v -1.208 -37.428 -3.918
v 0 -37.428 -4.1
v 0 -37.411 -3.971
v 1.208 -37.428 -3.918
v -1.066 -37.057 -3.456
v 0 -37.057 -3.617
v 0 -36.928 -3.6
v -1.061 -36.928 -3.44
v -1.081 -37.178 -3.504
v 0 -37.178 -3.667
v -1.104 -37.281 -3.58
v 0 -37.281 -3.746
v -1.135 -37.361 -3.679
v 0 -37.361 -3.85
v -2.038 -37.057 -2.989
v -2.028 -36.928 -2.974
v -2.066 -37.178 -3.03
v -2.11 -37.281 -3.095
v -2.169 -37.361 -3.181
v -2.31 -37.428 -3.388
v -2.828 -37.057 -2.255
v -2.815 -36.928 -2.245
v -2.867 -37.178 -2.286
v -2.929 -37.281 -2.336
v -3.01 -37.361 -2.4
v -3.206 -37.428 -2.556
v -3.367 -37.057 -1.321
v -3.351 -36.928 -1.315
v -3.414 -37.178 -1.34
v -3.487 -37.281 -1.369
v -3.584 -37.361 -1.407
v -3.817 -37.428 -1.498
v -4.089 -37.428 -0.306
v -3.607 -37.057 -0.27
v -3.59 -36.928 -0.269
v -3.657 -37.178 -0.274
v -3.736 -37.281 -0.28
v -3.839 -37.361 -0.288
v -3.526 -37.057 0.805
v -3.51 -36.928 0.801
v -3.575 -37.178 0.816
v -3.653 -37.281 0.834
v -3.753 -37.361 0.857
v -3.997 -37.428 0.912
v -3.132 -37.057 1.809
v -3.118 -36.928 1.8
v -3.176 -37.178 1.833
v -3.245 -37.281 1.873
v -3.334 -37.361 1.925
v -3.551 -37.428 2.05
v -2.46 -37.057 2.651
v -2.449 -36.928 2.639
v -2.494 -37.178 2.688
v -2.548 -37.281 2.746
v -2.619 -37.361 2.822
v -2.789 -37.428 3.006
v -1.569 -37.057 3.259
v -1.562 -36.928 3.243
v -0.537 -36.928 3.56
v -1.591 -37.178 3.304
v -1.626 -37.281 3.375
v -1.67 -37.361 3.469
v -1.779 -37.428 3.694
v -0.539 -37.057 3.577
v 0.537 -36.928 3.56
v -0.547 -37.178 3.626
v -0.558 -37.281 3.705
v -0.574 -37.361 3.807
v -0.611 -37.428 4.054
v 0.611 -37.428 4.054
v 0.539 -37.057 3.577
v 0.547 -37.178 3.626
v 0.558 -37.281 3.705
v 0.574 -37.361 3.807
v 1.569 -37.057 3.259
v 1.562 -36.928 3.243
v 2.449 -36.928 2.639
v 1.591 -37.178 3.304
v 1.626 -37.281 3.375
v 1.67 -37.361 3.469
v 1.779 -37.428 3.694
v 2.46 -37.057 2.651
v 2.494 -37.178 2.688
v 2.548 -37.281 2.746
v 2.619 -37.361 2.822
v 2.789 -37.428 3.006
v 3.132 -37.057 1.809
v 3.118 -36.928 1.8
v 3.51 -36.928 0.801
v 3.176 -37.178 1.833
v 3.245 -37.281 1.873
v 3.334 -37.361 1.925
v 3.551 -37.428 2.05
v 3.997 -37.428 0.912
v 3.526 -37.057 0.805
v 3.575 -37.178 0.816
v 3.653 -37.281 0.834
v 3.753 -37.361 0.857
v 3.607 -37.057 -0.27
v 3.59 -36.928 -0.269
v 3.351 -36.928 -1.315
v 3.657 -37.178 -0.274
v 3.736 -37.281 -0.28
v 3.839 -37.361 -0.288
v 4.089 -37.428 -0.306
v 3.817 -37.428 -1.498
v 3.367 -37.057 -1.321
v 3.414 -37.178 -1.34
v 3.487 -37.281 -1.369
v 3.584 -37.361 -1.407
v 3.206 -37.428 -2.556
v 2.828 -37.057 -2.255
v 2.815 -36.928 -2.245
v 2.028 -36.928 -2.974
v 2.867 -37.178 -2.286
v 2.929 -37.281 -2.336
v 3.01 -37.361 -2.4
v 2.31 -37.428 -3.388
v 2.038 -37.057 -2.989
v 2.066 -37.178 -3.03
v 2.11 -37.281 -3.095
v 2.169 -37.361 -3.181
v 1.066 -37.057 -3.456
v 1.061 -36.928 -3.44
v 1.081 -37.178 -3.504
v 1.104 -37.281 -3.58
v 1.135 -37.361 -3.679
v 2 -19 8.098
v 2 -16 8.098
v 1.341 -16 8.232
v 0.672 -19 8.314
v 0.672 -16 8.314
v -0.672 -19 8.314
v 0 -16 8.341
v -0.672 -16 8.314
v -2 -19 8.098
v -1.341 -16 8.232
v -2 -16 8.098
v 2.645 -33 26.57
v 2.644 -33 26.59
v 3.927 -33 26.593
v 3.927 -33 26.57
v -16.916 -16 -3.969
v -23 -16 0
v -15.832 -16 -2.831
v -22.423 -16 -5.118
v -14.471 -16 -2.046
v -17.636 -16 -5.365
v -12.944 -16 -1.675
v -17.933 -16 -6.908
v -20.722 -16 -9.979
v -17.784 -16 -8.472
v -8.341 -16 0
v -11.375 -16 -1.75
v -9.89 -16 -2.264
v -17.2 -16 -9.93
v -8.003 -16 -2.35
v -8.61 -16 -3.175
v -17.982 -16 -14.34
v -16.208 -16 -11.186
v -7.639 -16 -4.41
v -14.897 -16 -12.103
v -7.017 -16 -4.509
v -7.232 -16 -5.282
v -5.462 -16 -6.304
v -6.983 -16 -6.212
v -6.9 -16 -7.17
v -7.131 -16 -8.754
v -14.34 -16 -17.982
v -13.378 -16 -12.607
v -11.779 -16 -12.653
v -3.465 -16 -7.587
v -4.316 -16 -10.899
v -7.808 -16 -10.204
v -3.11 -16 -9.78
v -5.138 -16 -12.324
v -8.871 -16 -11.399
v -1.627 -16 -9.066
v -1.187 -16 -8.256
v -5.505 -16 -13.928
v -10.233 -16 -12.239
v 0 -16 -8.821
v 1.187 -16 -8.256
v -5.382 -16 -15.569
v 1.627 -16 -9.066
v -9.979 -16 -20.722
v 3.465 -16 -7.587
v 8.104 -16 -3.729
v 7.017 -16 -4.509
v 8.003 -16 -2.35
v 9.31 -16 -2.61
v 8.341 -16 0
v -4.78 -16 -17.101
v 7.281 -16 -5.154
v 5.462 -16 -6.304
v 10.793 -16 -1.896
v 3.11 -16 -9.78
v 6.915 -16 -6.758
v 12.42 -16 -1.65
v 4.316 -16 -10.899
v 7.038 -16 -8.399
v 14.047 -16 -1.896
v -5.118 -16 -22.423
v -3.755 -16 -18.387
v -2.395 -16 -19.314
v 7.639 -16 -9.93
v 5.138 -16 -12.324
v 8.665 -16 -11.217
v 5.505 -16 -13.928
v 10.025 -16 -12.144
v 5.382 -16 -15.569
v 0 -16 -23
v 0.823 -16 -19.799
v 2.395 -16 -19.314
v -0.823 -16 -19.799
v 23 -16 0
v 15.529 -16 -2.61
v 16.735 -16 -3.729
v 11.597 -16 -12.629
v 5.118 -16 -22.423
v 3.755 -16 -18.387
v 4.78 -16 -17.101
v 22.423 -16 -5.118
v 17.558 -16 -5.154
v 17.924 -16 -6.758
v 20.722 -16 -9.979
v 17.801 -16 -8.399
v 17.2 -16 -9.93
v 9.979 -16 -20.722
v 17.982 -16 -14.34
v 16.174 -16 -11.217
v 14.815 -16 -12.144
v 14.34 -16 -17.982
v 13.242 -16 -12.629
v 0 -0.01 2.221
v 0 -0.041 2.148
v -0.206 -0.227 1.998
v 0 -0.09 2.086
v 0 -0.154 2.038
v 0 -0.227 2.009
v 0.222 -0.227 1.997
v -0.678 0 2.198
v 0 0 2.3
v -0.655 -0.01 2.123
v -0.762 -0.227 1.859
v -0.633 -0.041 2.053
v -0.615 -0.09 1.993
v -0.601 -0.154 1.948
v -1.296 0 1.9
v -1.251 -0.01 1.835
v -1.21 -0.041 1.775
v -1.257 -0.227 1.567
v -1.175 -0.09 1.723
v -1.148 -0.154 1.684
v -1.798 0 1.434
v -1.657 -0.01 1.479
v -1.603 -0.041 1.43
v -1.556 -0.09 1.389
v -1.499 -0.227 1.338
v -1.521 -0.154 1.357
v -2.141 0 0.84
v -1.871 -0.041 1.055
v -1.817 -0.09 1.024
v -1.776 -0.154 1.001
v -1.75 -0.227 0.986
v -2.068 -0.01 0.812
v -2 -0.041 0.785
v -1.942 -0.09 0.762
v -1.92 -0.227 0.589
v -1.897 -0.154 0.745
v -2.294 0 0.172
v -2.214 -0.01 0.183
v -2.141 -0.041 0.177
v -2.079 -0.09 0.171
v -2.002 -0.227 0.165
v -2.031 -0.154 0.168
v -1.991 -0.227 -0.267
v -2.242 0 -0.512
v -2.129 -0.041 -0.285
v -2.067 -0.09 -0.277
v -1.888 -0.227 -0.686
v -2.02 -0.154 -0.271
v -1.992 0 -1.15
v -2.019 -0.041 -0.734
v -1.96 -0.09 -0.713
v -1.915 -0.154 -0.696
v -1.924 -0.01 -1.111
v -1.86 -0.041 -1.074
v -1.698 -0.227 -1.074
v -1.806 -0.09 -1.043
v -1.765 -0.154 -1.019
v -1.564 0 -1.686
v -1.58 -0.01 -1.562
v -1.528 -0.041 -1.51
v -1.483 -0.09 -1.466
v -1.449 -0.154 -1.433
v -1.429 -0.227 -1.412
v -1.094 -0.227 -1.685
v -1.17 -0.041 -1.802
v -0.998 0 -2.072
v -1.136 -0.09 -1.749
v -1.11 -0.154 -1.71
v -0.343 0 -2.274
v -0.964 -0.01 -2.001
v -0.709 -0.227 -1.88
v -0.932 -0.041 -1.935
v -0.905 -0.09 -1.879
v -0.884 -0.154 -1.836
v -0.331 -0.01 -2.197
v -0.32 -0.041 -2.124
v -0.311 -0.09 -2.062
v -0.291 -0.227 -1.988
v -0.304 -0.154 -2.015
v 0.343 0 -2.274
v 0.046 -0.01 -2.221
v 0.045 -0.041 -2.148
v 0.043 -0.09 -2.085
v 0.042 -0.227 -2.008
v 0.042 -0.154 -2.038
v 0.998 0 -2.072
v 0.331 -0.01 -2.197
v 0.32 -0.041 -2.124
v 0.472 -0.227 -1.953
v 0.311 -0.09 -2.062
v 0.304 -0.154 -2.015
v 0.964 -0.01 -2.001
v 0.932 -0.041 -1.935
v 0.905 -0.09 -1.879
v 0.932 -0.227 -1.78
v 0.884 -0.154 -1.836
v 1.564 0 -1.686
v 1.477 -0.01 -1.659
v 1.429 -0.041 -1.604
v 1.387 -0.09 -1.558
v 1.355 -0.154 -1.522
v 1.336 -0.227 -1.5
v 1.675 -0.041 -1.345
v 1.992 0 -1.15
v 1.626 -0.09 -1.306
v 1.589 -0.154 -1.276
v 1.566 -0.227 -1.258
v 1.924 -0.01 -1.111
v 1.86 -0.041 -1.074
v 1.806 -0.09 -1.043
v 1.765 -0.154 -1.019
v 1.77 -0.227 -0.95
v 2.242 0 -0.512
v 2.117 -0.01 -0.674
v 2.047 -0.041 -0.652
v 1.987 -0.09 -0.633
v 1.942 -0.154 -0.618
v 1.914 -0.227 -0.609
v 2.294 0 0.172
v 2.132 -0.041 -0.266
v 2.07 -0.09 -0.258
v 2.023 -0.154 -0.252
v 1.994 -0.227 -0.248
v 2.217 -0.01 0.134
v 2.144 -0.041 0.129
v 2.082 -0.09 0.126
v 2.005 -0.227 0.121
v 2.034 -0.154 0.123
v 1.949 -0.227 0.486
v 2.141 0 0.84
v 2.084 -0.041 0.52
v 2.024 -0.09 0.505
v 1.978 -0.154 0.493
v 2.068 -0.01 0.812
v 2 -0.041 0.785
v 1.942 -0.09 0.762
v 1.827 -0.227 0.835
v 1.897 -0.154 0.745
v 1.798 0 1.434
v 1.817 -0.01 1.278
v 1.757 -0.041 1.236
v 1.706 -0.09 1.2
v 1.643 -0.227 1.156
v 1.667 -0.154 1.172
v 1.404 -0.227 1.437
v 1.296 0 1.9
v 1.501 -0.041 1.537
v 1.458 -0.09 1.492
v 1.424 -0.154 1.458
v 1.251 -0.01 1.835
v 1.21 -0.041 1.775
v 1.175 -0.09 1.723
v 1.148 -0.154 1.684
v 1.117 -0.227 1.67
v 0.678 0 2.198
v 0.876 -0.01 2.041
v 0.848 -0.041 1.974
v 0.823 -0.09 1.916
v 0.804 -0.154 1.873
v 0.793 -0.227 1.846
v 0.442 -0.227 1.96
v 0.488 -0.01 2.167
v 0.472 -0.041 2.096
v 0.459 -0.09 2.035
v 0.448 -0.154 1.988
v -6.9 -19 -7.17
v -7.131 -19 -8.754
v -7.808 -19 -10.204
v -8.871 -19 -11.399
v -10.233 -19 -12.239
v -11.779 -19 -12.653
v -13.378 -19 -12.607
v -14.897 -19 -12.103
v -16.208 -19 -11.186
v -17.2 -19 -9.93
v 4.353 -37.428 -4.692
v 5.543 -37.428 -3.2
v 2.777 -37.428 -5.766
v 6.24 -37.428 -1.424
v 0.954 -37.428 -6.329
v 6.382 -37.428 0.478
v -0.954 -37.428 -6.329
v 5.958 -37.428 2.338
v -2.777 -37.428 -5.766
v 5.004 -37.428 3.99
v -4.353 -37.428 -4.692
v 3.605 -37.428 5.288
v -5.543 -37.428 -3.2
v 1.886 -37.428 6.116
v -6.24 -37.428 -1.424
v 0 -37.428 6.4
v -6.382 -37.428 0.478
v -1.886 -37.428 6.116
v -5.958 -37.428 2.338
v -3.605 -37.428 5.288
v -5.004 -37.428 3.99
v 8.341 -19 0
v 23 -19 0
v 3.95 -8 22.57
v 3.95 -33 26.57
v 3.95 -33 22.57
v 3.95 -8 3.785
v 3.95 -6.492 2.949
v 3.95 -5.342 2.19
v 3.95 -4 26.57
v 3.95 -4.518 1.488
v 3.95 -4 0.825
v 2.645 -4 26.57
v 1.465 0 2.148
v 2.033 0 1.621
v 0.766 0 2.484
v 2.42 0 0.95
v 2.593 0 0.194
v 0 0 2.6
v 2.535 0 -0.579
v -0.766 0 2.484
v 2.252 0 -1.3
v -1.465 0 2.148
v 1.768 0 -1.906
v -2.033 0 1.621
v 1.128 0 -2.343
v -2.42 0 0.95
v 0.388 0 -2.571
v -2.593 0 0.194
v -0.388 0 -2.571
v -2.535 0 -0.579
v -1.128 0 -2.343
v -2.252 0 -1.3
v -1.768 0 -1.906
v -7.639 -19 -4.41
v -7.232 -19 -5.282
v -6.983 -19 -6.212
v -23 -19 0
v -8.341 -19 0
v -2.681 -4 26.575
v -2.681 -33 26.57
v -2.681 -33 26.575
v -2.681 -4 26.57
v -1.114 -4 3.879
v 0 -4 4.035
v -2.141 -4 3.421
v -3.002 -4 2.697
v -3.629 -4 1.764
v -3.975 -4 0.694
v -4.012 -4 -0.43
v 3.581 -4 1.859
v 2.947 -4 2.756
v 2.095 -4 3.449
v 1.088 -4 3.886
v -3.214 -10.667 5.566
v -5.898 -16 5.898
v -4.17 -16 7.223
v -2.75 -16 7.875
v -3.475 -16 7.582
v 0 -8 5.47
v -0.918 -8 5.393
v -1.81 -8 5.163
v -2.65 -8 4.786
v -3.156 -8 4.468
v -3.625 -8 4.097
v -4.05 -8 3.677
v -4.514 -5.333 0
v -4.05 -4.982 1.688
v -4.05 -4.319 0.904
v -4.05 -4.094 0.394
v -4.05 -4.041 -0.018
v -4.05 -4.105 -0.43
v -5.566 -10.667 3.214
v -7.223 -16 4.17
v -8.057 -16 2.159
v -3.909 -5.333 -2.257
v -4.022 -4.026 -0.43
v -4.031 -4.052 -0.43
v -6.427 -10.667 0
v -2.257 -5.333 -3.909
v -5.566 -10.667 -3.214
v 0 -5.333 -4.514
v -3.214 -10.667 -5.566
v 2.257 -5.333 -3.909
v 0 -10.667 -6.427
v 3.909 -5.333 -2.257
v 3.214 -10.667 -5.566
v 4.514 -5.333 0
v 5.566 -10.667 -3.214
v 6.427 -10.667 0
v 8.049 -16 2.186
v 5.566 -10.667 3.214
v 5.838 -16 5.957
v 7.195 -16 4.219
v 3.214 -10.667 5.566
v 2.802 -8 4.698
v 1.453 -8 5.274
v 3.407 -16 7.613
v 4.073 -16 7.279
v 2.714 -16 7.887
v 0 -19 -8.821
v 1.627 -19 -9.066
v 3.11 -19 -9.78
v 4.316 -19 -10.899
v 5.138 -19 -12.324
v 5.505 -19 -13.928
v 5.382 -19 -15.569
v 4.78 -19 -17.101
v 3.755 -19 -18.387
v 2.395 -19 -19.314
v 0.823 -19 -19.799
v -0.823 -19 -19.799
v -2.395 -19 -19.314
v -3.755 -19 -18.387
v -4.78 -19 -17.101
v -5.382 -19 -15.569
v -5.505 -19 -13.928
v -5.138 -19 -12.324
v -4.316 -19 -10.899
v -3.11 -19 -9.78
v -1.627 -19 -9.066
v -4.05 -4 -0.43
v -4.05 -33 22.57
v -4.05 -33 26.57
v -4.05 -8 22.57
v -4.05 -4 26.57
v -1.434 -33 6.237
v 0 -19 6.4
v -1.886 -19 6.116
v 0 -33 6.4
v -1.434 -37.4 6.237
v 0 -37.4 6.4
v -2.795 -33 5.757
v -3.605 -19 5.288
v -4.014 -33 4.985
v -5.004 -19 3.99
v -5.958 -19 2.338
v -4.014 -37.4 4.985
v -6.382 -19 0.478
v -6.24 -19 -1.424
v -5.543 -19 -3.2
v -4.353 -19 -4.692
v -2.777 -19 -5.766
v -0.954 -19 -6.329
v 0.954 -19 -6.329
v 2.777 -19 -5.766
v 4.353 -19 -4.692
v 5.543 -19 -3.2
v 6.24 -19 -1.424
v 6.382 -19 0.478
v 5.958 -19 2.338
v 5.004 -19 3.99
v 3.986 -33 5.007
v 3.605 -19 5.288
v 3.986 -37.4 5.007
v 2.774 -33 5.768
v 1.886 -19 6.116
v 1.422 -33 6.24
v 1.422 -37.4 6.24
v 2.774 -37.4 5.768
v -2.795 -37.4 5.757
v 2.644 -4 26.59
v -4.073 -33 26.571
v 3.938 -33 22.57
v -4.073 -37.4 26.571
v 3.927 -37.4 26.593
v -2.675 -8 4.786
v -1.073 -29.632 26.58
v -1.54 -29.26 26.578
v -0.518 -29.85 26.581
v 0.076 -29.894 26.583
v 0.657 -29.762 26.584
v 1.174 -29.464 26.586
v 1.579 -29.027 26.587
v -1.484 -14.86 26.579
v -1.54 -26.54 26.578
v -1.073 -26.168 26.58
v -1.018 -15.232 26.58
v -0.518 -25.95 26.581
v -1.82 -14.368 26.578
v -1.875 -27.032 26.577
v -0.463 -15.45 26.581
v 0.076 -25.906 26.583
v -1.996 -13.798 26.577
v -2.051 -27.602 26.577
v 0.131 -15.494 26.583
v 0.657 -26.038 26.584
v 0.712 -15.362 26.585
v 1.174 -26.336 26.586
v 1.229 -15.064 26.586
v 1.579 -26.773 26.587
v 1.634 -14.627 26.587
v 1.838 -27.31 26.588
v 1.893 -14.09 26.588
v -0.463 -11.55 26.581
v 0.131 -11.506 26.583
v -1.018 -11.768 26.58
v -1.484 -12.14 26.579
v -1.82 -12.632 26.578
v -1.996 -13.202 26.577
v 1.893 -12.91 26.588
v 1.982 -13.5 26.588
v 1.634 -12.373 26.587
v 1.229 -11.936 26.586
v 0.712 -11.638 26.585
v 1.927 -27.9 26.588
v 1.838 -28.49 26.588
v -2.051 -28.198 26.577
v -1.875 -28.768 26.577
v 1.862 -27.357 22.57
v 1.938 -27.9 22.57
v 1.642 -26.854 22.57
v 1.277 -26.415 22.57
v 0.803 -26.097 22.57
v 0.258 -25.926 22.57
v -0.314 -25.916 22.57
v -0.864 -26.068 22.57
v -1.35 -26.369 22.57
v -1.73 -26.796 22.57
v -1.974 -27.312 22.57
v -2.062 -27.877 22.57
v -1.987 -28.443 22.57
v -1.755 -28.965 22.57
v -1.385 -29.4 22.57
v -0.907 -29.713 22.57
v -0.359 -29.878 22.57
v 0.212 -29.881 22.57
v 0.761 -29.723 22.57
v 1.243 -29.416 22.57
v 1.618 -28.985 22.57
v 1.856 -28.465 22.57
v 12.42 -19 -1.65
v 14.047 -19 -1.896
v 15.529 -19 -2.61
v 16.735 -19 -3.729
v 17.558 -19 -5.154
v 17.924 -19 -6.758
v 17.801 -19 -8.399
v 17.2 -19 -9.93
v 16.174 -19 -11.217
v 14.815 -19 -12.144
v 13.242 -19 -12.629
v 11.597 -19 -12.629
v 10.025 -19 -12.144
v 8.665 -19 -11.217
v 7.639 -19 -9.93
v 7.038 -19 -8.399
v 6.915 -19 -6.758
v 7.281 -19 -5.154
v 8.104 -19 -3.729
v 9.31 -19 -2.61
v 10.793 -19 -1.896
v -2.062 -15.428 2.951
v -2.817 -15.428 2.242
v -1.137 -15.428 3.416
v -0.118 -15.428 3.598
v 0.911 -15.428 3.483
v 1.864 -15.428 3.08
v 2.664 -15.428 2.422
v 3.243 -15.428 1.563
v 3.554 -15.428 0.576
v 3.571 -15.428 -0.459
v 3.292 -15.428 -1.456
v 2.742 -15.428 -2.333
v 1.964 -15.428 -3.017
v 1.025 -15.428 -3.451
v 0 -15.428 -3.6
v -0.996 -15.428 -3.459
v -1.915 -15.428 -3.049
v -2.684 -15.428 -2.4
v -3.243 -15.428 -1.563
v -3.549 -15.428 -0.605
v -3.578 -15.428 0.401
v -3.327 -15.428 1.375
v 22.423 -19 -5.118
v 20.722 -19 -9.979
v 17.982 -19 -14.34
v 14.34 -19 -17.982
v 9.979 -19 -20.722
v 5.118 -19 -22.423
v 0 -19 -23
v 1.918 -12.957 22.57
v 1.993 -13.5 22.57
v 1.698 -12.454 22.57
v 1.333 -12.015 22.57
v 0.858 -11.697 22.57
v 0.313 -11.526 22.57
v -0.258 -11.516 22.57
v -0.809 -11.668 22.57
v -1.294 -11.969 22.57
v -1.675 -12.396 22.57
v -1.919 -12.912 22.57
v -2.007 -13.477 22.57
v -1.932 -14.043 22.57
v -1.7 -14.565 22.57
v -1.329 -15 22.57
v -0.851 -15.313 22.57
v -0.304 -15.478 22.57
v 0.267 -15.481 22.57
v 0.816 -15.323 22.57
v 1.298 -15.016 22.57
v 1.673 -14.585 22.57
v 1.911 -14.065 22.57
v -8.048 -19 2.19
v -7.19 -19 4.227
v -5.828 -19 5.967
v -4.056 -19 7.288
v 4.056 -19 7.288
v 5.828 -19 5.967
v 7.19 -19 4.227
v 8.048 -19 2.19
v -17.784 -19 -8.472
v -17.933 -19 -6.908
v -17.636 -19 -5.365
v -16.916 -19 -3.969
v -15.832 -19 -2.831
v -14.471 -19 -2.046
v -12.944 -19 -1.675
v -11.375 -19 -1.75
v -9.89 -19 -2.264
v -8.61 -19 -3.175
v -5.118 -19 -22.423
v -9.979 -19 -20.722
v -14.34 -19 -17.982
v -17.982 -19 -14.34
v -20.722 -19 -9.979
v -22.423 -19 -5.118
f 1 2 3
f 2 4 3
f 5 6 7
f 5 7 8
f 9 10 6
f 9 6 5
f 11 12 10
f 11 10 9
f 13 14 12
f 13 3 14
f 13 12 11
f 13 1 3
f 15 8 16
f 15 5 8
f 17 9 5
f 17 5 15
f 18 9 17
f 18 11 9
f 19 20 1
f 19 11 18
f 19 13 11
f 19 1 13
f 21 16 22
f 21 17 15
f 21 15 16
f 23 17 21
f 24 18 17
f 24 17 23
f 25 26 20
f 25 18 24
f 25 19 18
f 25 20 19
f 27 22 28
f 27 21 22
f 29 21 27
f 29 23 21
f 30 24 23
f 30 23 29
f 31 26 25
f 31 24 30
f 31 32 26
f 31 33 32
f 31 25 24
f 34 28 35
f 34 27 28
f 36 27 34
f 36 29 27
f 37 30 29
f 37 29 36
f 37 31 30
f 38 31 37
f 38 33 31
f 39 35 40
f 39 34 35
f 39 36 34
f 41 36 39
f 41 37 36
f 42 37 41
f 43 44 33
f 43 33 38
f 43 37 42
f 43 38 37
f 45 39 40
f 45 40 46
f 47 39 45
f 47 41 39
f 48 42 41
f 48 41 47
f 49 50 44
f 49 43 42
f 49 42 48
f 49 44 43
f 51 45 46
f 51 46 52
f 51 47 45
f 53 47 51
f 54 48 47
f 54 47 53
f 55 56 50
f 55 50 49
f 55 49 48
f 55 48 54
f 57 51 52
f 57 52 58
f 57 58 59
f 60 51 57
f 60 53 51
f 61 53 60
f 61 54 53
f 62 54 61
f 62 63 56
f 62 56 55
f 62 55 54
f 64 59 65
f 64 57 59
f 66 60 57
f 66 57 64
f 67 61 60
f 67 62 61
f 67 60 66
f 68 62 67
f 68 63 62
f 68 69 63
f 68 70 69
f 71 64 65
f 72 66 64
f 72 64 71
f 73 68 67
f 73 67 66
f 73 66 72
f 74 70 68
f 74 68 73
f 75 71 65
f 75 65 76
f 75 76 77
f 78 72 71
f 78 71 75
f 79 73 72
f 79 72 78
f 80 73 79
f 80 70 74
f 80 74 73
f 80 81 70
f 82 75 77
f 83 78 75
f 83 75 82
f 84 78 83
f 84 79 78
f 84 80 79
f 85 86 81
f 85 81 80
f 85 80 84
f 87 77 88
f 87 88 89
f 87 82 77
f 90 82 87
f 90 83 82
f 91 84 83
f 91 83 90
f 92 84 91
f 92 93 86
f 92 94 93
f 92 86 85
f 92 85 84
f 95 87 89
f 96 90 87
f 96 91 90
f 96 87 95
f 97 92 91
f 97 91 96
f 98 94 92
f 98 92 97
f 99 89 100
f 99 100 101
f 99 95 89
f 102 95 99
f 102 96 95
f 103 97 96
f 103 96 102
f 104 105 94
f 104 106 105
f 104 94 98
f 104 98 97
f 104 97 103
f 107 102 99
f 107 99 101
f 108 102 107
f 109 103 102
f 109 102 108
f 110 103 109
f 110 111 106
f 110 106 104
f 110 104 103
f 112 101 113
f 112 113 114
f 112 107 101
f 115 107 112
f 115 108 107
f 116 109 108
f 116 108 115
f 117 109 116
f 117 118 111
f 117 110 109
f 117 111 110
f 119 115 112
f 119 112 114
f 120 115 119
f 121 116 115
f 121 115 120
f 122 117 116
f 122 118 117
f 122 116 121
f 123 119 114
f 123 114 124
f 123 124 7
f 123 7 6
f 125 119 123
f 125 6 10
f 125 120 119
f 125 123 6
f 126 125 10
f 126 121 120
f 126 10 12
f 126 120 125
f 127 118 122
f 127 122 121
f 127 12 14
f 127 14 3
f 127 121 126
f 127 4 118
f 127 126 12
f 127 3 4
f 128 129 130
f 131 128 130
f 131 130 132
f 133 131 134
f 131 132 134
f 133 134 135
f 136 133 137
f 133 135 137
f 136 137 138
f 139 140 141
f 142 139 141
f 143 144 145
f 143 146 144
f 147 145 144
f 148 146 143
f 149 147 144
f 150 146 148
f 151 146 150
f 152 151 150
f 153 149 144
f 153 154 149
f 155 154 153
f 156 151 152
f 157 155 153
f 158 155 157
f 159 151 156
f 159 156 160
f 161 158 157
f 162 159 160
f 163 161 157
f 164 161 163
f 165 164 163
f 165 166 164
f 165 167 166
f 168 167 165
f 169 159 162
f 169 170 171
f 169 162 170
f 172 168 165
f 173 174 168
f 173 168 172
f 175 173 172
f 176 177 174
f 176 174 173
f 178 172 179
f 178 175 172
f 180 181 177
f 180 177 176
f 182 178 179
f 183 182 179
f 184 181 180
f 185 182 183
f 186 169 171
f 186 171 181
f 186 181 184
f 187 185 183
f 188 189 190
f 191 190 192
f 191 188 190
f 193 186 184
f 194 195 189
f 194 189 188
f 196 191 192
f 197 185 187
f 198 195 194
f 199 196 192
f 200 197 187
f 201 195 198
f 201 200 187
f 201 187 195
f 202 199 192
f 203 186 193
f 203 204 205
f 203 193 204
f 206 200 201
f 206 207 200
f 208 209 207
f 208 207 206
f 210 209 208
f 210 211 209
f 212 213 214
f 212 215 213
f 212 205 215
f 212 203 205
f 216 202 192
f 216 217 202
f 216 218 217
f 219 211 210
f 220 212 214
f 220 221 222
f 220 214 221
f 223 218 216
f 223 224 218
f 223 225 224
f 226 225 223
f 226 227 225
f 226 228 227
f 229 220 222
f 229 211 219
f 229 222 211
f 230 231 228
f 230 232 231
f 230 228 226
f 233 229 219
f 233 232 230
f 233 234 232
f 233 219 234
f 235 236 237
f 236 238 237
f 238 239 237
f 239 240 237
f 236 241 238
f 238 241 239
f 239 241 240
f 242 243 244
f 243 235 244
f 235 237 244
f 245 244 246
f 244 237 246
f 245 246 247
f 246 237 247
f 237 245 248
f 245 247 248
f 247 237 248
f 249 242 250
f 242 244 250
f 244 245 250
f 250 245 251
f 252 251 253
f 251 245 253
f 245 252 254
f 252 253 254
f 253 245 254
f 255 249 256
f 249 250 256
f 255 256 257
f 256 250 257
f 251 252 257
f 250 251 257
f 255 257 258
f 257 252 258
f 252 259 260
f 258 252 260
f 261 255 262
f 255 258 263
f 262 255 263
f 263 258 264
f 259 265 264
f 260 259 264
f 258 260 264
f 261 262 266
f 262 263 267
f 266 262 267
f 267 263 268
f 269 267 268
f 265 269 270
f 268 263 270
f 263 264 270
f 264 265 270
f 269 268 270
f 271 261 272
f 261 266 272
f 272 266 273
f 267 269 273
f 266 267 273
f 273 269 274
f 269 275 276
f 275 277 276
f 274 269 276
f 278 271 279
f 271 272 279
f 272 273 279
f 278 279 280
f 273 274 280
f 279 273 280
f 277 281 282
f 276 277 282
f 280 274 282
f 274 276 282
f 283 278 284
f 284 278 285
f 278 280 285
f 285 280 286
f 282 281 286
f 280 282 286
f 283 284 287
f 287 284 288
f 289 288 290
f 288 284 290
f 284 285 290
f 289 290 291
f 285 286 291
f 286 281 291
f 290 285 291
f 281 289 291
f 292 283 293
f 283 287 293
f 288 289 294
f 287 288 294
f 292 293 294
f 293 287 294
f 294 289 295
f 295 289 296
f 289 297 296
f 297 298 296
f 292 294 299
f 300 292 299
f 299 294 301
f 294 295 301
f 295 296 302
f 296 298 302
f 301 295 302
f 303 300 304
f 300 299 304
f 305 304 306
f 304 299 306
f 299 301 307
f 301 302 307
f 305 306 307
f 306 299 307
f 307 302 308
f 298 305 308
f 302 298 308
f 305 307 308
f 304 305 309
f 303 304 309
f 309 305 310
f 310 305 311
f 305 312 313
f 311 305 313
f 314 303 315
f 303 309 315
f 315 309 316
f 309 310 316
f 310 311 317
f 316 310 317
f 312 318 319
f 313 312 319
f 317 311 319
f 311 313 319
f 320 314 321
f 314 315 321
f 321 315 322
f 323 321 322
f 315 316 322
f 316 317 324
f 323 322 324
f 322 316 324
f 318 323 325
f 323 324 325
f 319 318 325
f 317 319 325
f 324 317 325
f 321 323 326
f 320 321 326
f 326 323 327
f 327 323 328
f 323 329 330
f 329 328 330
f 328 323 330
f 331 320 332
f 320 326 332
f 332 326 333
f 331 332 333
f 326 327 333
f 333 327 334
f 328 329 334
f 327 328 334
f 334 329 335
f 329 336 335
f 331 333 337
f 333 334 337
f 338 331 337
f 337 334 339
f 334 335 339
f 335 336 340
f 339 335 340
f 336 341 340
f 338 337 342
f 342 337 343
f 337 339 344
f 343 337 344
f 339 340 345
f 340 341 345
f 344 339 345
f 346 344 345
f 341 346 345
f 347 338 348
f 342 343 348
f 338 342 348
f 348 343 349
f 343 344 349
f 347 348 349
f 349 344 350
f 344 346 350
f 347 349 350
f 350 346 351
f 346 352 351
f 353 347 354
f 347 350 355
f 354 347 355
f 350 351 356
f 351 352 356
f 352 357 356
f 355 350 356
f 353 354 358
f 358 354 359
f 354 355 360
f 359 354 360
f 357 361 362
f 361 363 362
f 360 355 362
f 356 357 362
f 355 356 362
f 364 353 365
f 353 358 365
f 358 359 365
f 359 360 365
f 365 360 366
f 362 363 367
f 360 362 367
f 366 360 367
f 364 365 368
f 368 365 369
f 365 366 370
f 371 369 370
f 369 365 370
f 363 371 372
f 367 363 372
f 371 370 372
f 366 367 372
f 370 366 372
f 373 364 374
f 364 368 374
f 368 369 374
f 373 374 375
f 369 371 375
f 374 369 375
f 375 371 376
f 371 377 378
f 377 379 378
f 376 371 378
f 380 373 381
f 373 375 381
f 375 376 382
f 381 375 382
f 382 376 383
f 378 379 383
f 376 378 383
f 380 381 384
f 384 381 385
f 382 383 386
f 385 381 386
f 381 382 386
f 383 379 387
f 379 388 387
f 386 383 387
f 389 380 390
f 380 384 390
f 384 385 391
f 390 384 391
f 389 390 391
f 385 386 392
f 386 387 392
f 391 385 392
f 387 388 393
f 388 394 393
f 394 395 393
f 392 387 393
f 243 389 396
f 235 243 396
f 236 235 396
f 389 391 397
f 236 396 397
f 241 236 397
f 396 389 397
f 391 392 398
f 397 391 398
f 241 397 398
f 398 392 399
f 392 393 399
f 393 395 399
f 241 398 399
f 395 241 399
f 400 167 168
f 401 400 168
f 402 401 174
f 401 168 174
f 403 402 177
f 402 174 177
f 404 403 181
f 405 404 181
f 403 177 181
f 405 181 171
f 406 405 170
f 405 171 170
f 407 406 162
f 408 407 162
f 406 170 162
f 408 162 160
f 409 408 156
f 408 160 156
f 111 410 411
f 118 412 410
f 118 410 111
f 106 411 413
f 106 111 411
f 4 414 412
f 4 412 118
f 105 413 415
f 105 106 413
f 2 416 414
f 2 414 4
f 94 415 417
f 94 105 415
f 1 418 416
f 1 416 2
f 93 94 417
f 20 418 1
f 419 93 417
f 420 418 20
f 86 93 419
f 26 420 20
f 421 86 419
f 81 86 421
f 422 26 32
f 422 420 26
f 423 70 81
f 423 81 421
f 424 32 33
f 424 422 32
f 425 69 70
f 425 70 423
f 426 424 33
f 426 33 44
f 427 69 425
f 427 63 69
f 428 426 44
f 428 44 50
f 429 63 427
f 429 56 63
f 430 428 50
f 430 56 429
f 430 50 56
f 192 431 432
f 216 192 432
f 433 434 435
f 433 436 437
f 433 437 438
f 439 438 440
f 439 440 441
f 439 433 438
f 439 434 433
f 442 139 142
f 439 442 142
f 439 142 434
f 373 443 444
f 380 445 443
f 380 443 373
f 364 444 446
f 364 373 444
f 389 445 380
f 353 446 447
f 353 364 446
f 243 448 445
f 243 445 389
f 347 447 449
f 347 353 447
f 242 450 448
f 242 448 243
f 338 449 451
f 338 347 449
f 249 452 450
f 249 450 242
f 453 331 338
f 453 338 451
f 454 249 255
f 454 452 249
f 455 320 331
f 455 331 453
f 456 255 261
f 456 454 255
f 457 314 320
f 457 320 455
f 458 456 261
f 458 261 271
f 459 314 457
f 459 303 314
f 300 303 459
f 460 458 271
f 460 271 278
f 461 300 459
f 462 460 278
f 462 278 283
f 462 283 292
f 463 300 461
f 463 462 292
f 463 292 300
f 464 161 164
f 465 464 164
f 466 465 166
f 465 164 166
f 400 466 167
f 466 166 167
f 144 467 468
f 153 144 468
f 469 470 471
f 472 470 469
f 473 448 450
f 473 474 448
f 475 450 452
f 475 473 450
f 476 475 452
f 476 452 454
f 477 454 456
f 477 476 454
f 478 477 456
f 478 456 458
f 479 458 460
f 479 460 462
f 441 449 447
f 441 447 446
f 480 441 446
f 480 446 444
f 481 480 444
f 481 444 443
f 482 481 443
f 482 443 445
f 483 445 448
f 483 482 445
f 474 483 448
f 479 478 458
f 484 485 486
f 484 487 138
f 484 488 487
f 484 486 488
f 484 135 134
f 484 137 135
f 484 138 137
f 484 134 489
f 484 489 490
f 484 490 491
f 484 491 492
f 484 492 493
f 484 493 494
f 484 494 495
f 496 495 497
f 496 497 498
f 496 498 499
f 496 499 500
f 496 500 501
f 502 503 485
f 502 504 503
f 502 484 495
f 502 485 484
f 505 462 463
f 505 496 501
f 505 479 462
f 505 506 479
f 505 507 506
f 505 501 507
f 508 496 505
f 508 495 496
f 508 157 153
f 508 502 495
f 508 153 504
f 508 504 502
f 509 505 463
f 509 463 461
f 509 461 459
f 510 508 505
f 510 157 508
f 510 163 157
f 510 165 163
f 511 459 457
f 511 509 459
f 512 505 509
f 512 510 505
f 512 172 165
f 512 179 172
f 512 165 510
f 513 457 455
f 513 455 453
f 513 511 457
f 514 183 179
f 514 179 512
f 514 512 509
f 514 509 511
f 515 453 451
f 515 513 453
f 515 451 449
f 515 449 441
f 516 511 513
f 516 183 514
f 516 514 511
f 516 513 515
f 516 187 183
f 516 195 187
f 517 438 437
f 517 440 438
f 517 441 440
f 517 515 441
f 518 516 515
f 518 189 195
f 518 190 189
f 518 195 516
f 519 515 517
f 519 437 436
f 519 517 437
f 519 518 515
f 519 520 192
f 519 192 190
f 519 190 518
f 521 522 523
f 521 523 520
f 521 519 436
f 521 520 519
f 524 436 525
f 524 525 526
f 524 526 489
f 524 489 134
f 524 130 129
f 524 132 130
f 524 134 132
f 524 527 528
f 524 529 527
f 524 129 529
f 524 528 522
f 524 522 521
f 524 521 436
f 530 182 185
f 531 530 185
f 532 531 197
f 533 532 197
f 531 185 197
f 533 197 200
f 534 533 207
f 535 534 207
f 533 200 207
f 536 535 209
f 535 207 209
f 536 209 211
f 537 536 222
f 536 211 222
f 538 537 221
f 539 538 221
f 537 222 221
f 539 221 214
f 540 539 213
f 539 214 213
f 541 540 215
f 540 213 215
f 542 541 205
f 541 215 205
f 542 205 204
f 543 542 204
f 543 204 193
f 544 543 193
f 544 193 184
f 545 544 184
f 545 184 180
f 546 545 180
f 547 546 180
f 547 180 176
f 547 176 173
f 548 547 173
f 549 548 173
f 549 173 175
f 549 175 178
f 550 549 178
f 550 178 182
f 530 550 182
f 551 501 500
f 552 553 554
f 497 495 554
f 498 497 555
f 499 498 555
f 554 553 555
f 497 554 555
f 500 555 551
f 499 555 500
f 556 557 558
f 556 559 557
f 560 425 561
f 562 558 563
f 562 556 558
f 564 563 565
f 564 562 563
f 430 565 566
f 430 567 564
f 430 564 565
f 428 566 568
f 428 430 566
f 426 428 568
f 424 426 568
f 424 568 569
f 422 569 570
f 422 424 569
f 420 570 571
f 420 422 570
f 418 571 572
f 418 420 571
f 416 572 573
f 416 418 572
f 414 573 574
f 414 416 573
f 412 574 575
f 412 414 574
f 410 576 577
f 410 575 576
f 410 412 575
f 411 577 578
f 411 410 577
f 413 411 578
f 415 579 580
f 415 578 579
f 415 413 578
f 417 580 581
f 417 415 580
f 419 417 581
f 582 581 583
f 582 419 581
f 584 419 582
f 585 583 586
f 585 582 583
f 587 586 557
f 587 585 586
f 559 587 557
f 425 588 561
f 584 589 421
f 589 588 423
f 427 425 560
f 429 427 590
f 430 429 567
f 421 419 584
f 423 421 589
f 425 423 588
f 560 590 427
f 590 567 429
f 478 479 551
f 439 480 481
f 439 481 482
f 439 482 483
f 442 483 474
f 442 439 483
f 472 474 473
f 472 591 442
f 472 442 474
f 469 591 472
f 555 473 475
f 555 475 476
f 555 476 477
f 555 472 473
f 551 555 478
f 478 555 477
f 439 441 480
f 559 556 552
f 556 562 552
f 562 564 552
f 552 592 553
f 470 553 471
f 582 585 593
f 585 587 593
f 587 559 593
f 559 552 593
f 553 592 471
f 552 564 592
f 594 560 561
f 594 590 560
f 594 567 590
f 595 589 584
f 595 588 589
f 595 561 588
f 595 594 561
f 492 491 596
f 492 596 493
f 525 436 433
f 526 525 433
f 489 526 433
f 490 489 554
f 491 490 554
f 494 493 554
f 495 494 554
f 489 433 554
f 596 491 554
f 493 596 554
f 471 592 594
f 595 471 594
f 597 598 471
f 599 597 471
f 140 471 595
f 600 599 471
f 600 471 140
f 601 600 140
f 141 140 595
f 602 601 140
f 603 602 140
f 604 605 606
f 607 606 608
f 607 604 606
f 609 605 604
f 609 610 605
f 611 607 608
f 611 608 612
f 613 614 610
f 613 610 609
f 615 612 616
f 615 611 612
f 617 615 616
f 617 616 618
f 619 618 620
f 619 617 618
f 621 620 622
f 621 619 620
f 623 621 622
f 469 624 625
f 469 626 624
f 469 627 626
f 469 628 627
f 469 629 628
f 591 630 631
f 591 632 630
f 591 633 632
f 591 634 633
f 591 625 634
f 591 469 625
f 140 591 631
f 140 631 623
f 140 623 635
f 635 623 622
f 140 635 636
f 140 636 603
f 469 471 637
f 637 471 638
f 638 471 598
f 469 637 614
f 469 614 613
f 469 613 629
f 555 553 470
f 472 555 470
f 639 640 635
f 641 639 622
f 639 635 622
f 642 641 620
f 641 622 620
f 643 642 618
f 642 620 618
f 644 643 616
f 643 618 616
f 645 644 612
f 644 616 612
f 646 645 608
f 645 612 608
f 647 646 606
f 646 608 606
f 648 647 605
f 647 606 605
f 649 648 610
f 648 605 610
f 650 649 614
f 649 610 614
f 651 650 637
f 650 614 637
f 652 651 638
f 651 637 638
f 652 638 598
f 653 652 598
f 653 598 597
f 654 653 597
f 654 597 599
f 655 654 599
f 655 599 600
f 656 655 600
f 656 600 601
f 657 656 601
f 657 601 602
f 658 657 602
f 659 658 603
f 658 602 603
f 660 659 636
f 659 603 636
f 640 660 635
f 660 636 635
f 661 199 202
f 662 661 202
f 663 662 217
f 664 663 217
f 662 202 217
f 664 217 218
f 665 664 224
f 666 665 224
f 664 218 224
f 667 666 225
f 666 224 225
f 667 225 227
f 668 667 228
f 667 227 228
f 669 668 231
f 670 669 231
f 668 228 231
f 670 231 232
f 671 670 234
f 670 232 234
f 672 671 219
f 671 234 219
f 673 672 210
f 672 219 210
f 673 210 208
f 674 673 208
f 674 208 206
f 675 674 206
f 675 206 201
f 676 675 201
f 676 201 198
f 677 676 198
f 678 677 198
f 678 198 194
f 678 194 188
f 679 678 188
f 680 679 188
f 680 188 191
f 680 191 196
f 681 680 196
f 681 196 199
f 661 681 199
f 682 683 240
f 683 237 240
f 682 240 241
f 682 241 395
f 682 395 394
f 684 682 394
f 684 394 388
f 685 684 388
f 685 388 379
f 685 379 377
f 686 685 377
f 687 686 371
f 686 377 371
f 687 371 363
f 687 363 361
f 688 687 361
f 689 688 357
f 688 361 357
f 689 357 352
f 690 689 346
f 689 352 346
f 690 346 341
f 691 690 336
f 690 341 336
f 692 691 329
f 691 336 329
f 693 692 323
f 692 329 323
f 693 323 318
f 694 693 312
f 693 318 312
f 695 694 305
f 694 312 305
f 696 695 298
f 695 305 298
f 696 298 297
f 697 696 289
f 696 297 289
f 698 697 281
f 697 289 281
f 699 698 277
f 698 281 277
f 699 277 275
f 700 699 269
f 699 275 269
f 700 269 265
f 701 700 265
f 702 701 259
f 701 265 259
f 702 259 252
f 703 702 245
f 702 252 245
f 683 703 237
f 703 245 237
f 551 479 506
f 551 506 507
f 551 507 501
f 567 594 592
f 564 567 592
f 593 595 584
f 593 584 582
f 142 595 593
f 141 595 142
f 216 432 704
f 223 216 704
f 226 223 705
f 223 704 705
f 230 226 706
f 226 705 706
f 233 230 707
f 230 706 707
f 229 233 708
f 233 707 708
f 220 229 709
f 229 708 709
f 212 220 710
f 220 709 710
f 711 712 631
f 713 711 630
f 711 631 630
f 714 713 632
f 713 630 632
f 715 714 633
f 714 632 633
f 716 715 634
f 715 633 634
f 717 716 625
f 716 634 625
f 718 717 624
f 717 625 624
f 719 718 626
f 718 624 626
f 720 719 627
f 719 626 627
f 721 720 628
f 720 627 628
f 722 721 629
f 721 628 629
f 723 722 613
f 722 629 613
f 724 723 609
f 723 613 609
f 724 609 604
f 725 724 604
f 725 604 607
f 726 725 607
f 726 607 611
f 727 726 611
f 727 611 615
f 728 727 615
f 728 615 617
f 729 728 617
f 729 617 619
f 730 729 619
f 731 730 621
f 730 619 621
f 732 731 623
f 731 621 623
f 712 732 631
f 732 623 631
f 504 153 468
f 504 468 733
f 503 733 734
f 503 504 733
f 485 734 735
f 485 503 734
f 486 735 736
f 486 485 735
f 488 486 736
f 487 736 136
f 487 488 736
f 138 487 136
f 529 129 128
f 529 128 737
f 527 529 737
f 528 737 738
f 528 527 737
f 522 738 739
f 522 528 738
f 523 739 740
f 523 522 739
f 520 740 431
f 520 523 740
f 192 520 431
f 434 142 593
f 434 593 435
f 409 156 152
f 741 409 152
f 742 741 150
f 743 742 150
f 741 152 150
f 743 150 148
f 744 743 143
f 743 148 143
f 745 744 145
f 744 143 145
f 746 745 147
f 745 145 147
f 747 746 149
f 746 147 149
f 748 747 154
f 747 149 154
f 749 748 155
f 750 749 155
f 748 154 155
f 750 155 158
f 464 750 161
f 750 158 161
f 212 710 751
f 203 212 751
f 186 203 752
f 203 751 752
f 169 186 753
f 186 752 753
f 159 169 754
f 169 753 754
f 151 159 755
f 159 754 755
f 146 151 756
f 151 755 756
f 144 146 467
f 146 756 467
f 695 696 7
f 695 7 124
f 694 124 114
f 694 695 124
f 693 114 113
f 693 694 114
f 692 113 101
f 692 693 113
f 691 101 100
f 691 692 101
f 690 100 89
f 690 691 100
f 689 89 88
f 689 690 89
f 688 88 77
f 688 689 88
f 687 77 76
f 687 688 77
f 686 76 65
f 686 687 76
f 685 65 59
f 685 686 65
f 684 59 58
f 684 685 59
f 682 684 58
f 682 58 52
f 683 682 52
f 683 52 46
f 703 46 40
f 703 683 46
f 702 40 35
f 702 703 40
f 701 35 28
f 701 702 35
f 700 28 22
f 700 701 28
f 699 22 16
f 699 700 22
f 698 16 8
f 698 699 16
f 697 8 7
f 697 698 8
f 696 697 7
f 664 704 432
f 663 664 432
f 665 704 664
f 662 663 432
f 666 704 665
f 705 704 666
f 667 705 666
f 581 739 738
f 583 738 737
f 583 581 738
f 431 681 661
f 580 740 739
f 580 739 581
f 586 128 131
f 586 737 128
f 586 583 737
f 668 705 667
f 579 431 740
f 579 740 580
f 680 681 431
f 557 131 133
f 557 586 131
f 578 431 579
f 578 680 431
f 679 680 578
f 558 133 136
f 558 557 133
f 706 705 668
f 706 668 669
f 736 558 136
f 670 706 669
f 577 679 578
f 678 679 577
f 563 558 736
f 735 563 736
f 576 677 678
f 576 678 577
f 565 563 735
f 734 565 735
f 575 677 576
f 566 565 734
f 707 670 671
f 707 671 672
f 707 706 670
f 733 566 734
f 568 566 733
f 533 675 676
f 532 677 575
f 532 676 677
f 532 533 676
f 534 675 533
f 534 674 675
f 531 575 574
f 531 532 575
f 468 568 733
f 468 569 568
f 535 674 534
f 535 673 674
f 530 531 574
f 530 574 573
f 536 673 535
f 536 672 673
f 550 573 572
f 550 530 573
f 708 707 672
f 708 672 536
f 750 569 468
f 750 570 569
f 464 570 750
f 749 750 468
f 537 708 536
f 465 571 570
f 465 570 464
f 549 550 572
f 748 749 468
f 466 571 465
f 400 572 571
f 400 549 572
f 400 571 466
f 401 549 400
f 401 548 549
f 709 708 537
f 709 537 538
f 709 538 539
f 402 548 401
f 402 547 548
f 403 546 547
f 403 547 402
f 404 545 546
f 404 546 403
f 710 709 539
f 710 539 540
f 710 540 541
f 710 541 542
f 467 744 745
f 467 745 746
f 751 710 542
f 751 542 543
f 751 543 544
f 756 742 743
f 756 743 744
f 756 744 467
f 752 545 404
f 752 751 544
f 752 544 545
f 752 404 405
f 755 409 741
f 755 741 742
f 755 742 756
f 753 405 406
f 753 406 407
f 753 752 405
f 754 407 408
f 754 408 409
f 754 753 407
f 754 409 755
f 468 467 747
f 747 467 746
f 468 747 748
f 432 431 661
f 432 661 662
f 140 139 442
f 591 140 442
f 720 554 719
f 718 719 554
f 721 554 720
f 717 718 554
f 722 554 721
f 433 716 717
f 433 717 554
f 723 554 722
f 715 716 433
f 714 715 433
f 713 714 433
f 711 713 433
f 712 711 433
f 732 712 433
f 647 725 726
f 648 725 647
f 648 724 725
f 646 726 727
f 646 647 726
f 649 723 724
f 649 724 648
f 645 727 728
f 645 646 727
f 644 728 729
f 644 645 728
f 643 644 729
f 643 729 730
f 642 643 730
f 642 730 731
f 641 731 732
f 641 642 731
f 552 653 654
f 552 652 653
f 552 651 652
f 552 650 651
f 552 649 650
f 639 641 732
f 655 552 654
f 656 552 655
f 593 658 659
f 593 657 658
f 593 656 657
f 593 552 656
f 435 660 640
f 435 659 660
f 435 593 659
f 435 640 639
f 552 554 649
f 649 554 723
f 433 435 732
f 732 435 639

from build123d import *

# Parameters (mm, degrees)
FILLET1_R                 = 0.3
CUT_EXTRUDE1_DEPTH        = 1
CUT_EXTRUDE1_DEPTH_BACK   = 22
SKETCH3_R                 = 3.6
FILLET2_R                 = 0.5
FILLET3_R                 = 0.5
SKETCH11_R                = 5.52
CUT_EXTRUDE3_DEPTH        = 10
CUT_EXTRUDE4_START        = -10
CUT_EXTRUDE4_DEPTH        = 10
BOSS_EXTRUDE1_START       = -3
BOSS_EXTRUDE1_DEPTH       = 3
BOSS_EXTRUDE4_START       = -3
BOSS_EXTRUDE4_DEPTH       = 3
CUT_EXTRUDE5_DEPTH        = 4
SKETCH22_W                = 4
SKETCH22_H                = 3
BOSS_EXTRUDE6_DEPTH       = 15
CUT_EXTRUDE6_START        = 21
SKETCH25_R                = 3.6
CUT_EXTRUDE6_DEPTH        = 21
BOSS_EXTRUDE7_DEPTH       = 3
BOSS_EXTRUDE7_DEPTH_BACK  = 0.5
SKETCH26_W                = 5
SKETCH26_H                = 24
SKETCH27_R                = 1.5
CUT_EXTRUDE8_DEPTH        = 3.5
CUT_EXTRUDE9_DEPTH        = 25
BOSS_EXTRUDE8_DEPTH       = 4
BOSS_EXTRUDE13_DEPTH      = 5.325316
BOSS_EXTRUDE14_DEPTH      = 2
BOSS_EXTRUDE14_DEPTH_BACK = 2
SKETCH44_W                = 5.325340097
SKETCH44_H                = 33.353922233
SKETCH45_W                = 8
SKETCH45_H                = 4.4
BOSS_EXTRUDE15_DEPTH      = 22
SKETCH47_W                = 8
SKETCH47_H                = 4
BOSS_EXTRUDE16_DEPTH      = 29
SKETCH48_W                = 8
SKETCH48_H                = 4
BOSS_EXTRUDE17_DEPTH      = 23
SKETCH52_R                = 2
CUT_EXTRUDE10_DEPTH       = 4.1


with BuildPart() as part:
    # Sketch2 → Revolve1 (revolve)
    with BuildSketch(Plane.XY, mode=Mode.PRIVATE) as revolve1_sk:
        Polygon((2, 0), (2.6, 0), (8.340902118, -16), (20.340902118, -16), (20.340902118, -19), (6.4, -19), (6.4, -37.427752697), (3.4, -37.427752697), (3.4, -16), (2, -16), align=None)
    revolve(revolve1_sk.sketch.rotate(Axis((0, 0, 0), (0, -1, 0)), 90), axis=Axis((0, 0, 0), (0, -1, 0)))

    # Fillet1
    fillet1_edges = [part.edges().sort_by_distance(p)[0] for p in [
        (0, 0, -2),
    ]]
    fillet(fillet1_edges, radius=FILLET1_R)

    # Sketch3 → Cut-Extrude1 (cut, two sides: drawn at the far end of the back side and taken through both)
    with BuildSketch(Plane.XZ.offset(37.427752697).offset(-CUT_EXTRUDE1_DEPTH_BACK)):
        with Locations(Location((0, 0, 0), (0, 0, 270))):
            Circle(SKETCH3_R)
    extrude(amount=CUT_EXTRUDE1_DEPTH + CUT_EXTRUDE1_DEPTH_BACK, mode=Mode.SUBTRACT)

    # Fillet2
    fillet2_edges = [part.edges().sort_by_distance(p)[0] for p in [
        (0, -15.427752697, -2),
    ]]
    fillet(fillet2_edges, radius=FILLET2_R)

    # Fillet3
    fillet3_edges = [part.edges().sort_by_distance(p)[0] for p in [
        (0, -37.427752697, 3.6),
    ]]
    fillet(fillet3_edges, radius=FILLET3_R)

    # Sketch5 → Cut-Loft2 section 0
    with BuildSketch(Plane(origin=(0, -16, 0), x_dir=(1, 0, 0), z_dir=(0, 1, 0))):
        with BuildLine():
            Line((-3.25, -14), (3.25, -14))
            Line((3.25, -14), (3.25, -16))
            Line((3.25, -16), (-3.25, -16))
            Line((-3.25, -16), (-3.25, -14))
        make_face()
    # Sketch6 → Cut-Loft2 section 1
    with BuildSketch(Plane.XZ.offset(19)):
        with BuildLine():
            Line((4.25, 14), (-4.25, 14))
            Line((-4.25, 14), (-4.25, 16))
            Line((-4.25, 16), (4.25, 16))
            Line((4.25, 16), (4.25, 14))
        make_face()
    loft(mode=Mode.SUBTRACT)

    # Sketch8 → Cut-Loft3 section 0
    with BuildSketch(Plane.XZ.offset(19)):
        with BuildLine():
            Line((4.25, 13.5), (-4.25, 13.5))
            Line((-4.25, 13.5), (-4.25, 16.5))
            Line((-4.25, 16.5), (4.25, 16.5))
            Line((4.25, 16.5), (4.25, 13.5))
        make_face()
    # Sketch7 → Cut-Loft3 section 1
    with BuildSketch(Plane(origin=(0, -16, 0), x_dir=(1, 0, 0), z_dir=(0, 1, 0))):
        with BuildLine():
            Line((-3.25, -13.5), (3.25, -13.5))
            Line((3.25, -13.5), (3.25, -16.5))
            Line((3.25, -16.5), (-3.25, -16.5))
            Line((-3.25, -16.5), (-3.25, -13.5))
        make_face()
    loft(mode=Mode.SUBTRACT)

    # Sketch11 → Cut-Extrude3 (cut)
    with BuildSketch(Plane(origin=(0, -16, 0), x_dir=(1, 0, 0), z_dir=(0, 1, 0))):
        with Locations(Location((0, 14.340902118, 0), (0, 0, 270))):
            Circle(SKETCH11_R)
        with Locations(Location((12.419585547, 7.170451059, 0), (0, 0, 270))):
            Circle(SKETCH11_R)
        with BuildLine():
            ThreePointArc((-17.200045776, 9.930451059), (-15.179585547, 2.38999083), (-7.639125318, 4.410451059))
            Line((-7.639125318, 4.410451059), (-12.419585547, 7.170451059))
            Line((-12.419585547, 7.170451059), (-17.200045776, 9.930451059))
        make_face()
        with BuildLine():
            Line((-12.419585547, 7.170451059), (-7.639125318, 4.410451059))
            ThreePointArc((-7.639125318, 4.410451059), (-7.087674986, 5.74176993), (-6.899585547, 7.170451059))
            ThreePointArc((-6.899585547, 7.170451059), (-10.990904418, 12.50236162), (-17.200045776, 9.930451059))
            Line((-17.200045776, 9.930451059), (-12.419585547, 7.170451059))
        make_face()
    extrude(amount=-CUT_EXTRUDE3_DEPTH, mode=Mode.SUBTRACT)

    # Sketch13 → Cut-Extrude4 (cut)
    with BuildSketch(Plane(origin=(0, -16, 0), x_dir=(1, 0, 0), z_dir=(0, 1, 0)).offset(CUT_EXTRUDE4_START)):
        with BuildLine():
            Line((-8.340902118, 0), (-20.340902118, 0))
            ThreePointArc((-20.340902118, 0), (-17.61573797, -10.170451059), (-10.170451059, -17.61573797))
            Line((-10.170451059, -17.61573797), (-4.170451059, -7.223433125))
            ThreePointArc((-4.170451059, -7.223433125), (-7.223433125, -4.170451059), (-8.340902118, 0))
        make_face()
        with BuildLine():
            Line((8.340902118, 0), (20.340902118, 0))
            ThreePointArc((20.340902118, 0), (17.546873261, -10.288806428), (9.932362997, -17.751069384))
            Line((9.932362997, -17.751069384), (4.072821701, -7.278926537))
            ThreePointArc((4.072821701, -7.278926537), (7.195194761, -4.218983349), (8.340902118, 0))
        make_face()
    extrude(amount=CUT_EXTRUDE4_DEPTH, mode=Mode.SUBTRACT)

    # Sketch14 → Boss-Extrude1 (add)
    with BuildSketch(Plane(origin=(0, -16, 0), x_dir=(1, 0, 0), z_dir=(0, 1, 0)).offset(BOSS_EXTRUDE1_START)):
        with BuildLine():
            ThreePointArc((0, 20.340902118), (14.383189823, 14.383189823), (20.340902118, 0))
            Line((20.340902118, 0), (23, 0))
            ThreePointArc((23, 0), (16.263455967, 16.263455967), (0, 23))
            Line((0, 23), (0, 20.340902118))
        make_face()
        with BuildLine():
            Line((-23, 0), (-20.340902118, 0))
            ThreePointArc((-20.340902118, 0), (-14.383189823, 14.383189823), (0, 20.340902118))
            Line((0, 20.340902118), (0, 23))
            ThreePointArc((0, 23), (-16.263455967, 16.263455967), (-23, 0))
        make_face()
    extrude(amount=BOSS_EXTRUDE1_DEPTH)

    # Sketch15 → Boss-Extrude4 (add)
    with BuildSketch(Plane(origin=(0, -16, 0), x_dir=(1, 0, 0), z_dir=(0, 1, 0)).offset(BOSS_EXTRUDE4_START)):
        with BuildLine():
            Line((-10.170451059, -17.61573797), (-8.340902118, 0))
            ThreePointArc((-8.340902118, 0), (0, -8.340902118), (8.340902118, 0))
            Line((8.340902118, 0), (9.932362997, -17.751069384))
            Line((9.932362997, -17.751069384), (0.261097866, -9.671265132))
            Line((0.261097866, -9.671265132), (-10.170451059, -17.61573797))
        make_face()
    extrude(amount=BOSS_EXTRUDE4_DEPTH)

    # Sketch21 → Cut-Extrude5 (cut)
    with BuildSketch(Plane(origin=(0, -16, 0), x_dir=(1, 0, 0), z_dir=(0, 1, 0))):
        with BuildLine():
            Line((8.340902118, 0), (11.037170737, -19.071811198))
            Line((11.037170737, -19.071811198), (-8.909760665, -24.214958869))
            Line((-8.909760665, -24.214958869), (-14.933909552, -10.991923284))
            Line((-14.933909552, -10.991923284), (-8.340902118, 0))
            ThreePointArc((-8.340902118, 0), (0, -8.340902118), (8.340902118, 0))
        make_face()
    extrude(amount=-CUT_EXTRUDE5_DEPTH, mode=Mode.SUBTRACT)

    # Sketch22 → Boss-Extrude6 (add)
    with BuildSketch(Plane.XY):
        with Locations((0, -17.5)):
            Rectangle(SKETCH22_W, SKETCH22_H)
    extrude(amount=BOSS_EXTRUDE6_DEPTH)

    # Sketch25 → Cut-Extrude6 (cut)
    with BuildSketch(Plane.XZ.offset(15.427752697).offset(CUT_EXTRUDE6_START)):
        with Locations(Location((0, 0, 0), (0, 0, 270))):
            Circle(SKETCH25_R)
    extrude(amount=-CUT_EXTRUDE6_DEPTH, mode=Mode.SUBTRACT)

    # Sketch26 → Boss-Extrude7 (add, two sides: drawn at the far end of the back side and taken through both)
    with BuildSketch(Plane.XY.offset(15).offset(-BOSS_EXTRUDE7_DEPTH_BACK)):
        with Locations((0, -28)):
            Rectangle(SKETCH26_W, SKETCH26_H)
    extrude(amount=BOSS_EXTRUDE7_DEPTH + BOSS_EXTRUDE7_DEPTH_BACK)

    # Sketch27 → Cut-Extrude8 (cut)
    with BuildSketch(Plane.XY.offset(18)):
        with Locations((0, -23)):
            Circle(SKETCH27_R)
        with Locations((0, -36)):
            Circle(SKETCH27_R)
    extrude(amount=-CUT_EXTRUDE8_DEPTH, mode=Mode.SUBTRACT)

    # Sketch28 → Cut-Extrude9 (cut)
    with BuildSketch(Plane(origin=(0, -16, 0), x_dir=(1, 0, 0), z_dir=(0, 1, 0))):
        with BuildLine():
            Line((-2, -8.097570509), (-5.786507294, -17.910682883))
            Line((-5.786507294, -17.910682883), (0.518098533, -20.020427682))
            Line((0.518098533, -20.020427682), (6.463906516, -17.731908852))
            Line((6.463906516, -17.731908852), (2, -8.097570509))
            ThreePointArc((2, -8.097570509), (0, -8.340902118), (-2, -8.097570509))
        make_face()
    extrude(amount=-CUT_EXTRUDE9_DEPTH, mode=Mode.SUBTRACT)

    # Sketch32 → Boss-Extrude8 (add)
    with BuildSketch(Plane(origin=(0, -8, 0), x_dir=(1, 0, 0), z_dir=(0, 1, 0))):
        with BuildLine():
            Line((2.65, -4.58993464), (2.65, -24.58993464))
            Line((2.65, -24.58993464), (-2.675318541, -24.575223569))
            Line((-2.675318541, -24.575223569), (-2.675318541, -4.575223569))
            ThreePointArc((-2.675318541, -4.575223569), (-1.400004277, -5.111749996), (-0.029282035, -5.299919109))
            ThreePointArc((-0.029282035, -5.299919109), (1.357593514, -5.123176734), (2.65, -4.58993464))
        make_face()
    extrude(amount=BOSS_EXTRUDE8_DEPTH)

    # Sketch41 → Boss-Extrude13 (add)
    with BuildSketch(Plane(origin=(2.65, 0, 0), x_dir=(0, 0, -1), z_dir=(1, 0, 0))):
        Polygon((-4.785742867, -8), (-6.72871788, -4), (-1.31380645, -4), (-1.671551647, -4.254674229), align=None)
    extrude(amount=-BOSS_EXTRUDE13_DEPTH)

    # Sketch44 → Boss-Extrude14 (add, two sides: drawn at the far end of the back side and taken through both)
    with BuildSketch(Plane(origin=(-0.067908393, 0, 24.58242648), x_dir=(0.9999961843816741, 0, 0.002762466668195937), z_dir=(-0.002762466668195937, 0, 0.9999961843816741)).offset(-BOSS_EXTRUDE14_DEPTH_BACK)):
        with Locations((0.055249952, -20.676961117)):
            Rectangle(SKETCH44_W, SKETCH44_H)
    extrude(amount=BOSS_EXTRUDE14_DEPTH + BOSS_EXTRUDE14_DEPTH_BACK)

    # Sketch45 → Boss-Extrude15 (add)
    with BuildSketch(Plane(origin=(-0.073433326, 0, 26.582418849), x_dir=(0.9999961843816741, 0, 0.002762466668195939), z_dir=(-0.002762466668195939, 0, 0.9999961843816741))):
        with Locations((0, -35.2)):
            Rectangle(SKETCH45_W, SKETCH45_H)
    extrude(amount=-BOSS_EXTRUDE15_DEPTH)

    # Sketch47 → Boss-Extrude16 (add)
    with BuildSketch(Plane(origin=(0, -33, 0), x_dir=(1, 0, 0), z_dir=(0, 1, 0))):
        with Locations((-0.05, -24.57)):
            Rectangle(SKETCH47_W, SKETCH47_H)
    extrude(amount=BOSS_EXTRUDE16_DEPTH)

    # Sketch48 → Boss-Extrude17 (add)
    with BuildSketch(Plane(origin=(0, 0, 22.57), x_dir=(-1, 0, 0), z_dir=(0, 0, -1))):
        with Locations((0.05, -6)):
            Rectangle(SKETCH48_W, SKETCH48_H)
    extrude(amount=BOSS_EXTRUDE17_DEPTH)

    # Cut-Loft5: read off the stored shape, not the designer's step
    # Cut-Loft5: loft between two sections, ruled curve by curve
    cut_loft5_from = [
        Edge.make_bspline([(-2.816606918, -15.427752697, 2.24203601), (1.667465101, -15.427752697, 7.875249846), (7.300678938, -15.427752697, 3.391177826), (2.816606918, -15.427752697, -2.24203601), (-1.667465101, -15.427752697, -7.875249846), (-7.300678938, -15.427752697, -3.391177826), (-2.816606918, -15.427752697, 2.24203601)], [0, 0, 0, 0, 0.5, 0.5, 0.5, 1, 1, 1, 1], 3, [1, 0.333333333, 0.333333333, 1, 0.333333333, 0.333333333, 1]),
    ]
    cut_loft5_to = [
        Edge.make_bspline([(-0.167077254, 0, 1.994679974), (3.822282693, 0, 2.328834482), (4.156437201, 0, -1.660525465), (0.167077254, 0, -1.994679974), (-3.822282693, 0, -2.328834482), (-4.156437201, 0, 1.660525465), (-0.167077254, 0, 1.994679974)], [0, 0, 0, 0, 0.5, 0.5, 0.5, 1, 1, 1, 1], 3, [1, 0.333333333, 0.333333333, 1, 0.333333333, 0.333333333, 1]),
    ]
    cut_loft5 = Solid(Shell([*[Face.make_surface_from_curves(cut_loft5_from[k], cut_loft5_to[k]) for k in range(1)], Face(Wire(cut_loft5_from)), Face(Wire(cut_loft5_to))]))
    add(cut_loft5, mode=Mode.SUBTRACT)

    # Sketch52 → Cut-Extrude10 (cut)
    with BuildSketch(Plane(origin=(-0.073433326, 0, 26.582418849), x_dir=(0.9999961843816741, 0, 0.002762466668195939), z_dir=(-0.002762466668195939, 0, 0.9999961843816741))):
        with Locations((0.055249952, -13.5)):
            Circle(SKETCH52_R)
        with Locations((0, -27.9)):
            Circle(SKETCH52_R)
    extrude(amount=-CUT_EXTRUDE10_DEPTH, mode=Mode.SUBTRACT)


solid = part.part
